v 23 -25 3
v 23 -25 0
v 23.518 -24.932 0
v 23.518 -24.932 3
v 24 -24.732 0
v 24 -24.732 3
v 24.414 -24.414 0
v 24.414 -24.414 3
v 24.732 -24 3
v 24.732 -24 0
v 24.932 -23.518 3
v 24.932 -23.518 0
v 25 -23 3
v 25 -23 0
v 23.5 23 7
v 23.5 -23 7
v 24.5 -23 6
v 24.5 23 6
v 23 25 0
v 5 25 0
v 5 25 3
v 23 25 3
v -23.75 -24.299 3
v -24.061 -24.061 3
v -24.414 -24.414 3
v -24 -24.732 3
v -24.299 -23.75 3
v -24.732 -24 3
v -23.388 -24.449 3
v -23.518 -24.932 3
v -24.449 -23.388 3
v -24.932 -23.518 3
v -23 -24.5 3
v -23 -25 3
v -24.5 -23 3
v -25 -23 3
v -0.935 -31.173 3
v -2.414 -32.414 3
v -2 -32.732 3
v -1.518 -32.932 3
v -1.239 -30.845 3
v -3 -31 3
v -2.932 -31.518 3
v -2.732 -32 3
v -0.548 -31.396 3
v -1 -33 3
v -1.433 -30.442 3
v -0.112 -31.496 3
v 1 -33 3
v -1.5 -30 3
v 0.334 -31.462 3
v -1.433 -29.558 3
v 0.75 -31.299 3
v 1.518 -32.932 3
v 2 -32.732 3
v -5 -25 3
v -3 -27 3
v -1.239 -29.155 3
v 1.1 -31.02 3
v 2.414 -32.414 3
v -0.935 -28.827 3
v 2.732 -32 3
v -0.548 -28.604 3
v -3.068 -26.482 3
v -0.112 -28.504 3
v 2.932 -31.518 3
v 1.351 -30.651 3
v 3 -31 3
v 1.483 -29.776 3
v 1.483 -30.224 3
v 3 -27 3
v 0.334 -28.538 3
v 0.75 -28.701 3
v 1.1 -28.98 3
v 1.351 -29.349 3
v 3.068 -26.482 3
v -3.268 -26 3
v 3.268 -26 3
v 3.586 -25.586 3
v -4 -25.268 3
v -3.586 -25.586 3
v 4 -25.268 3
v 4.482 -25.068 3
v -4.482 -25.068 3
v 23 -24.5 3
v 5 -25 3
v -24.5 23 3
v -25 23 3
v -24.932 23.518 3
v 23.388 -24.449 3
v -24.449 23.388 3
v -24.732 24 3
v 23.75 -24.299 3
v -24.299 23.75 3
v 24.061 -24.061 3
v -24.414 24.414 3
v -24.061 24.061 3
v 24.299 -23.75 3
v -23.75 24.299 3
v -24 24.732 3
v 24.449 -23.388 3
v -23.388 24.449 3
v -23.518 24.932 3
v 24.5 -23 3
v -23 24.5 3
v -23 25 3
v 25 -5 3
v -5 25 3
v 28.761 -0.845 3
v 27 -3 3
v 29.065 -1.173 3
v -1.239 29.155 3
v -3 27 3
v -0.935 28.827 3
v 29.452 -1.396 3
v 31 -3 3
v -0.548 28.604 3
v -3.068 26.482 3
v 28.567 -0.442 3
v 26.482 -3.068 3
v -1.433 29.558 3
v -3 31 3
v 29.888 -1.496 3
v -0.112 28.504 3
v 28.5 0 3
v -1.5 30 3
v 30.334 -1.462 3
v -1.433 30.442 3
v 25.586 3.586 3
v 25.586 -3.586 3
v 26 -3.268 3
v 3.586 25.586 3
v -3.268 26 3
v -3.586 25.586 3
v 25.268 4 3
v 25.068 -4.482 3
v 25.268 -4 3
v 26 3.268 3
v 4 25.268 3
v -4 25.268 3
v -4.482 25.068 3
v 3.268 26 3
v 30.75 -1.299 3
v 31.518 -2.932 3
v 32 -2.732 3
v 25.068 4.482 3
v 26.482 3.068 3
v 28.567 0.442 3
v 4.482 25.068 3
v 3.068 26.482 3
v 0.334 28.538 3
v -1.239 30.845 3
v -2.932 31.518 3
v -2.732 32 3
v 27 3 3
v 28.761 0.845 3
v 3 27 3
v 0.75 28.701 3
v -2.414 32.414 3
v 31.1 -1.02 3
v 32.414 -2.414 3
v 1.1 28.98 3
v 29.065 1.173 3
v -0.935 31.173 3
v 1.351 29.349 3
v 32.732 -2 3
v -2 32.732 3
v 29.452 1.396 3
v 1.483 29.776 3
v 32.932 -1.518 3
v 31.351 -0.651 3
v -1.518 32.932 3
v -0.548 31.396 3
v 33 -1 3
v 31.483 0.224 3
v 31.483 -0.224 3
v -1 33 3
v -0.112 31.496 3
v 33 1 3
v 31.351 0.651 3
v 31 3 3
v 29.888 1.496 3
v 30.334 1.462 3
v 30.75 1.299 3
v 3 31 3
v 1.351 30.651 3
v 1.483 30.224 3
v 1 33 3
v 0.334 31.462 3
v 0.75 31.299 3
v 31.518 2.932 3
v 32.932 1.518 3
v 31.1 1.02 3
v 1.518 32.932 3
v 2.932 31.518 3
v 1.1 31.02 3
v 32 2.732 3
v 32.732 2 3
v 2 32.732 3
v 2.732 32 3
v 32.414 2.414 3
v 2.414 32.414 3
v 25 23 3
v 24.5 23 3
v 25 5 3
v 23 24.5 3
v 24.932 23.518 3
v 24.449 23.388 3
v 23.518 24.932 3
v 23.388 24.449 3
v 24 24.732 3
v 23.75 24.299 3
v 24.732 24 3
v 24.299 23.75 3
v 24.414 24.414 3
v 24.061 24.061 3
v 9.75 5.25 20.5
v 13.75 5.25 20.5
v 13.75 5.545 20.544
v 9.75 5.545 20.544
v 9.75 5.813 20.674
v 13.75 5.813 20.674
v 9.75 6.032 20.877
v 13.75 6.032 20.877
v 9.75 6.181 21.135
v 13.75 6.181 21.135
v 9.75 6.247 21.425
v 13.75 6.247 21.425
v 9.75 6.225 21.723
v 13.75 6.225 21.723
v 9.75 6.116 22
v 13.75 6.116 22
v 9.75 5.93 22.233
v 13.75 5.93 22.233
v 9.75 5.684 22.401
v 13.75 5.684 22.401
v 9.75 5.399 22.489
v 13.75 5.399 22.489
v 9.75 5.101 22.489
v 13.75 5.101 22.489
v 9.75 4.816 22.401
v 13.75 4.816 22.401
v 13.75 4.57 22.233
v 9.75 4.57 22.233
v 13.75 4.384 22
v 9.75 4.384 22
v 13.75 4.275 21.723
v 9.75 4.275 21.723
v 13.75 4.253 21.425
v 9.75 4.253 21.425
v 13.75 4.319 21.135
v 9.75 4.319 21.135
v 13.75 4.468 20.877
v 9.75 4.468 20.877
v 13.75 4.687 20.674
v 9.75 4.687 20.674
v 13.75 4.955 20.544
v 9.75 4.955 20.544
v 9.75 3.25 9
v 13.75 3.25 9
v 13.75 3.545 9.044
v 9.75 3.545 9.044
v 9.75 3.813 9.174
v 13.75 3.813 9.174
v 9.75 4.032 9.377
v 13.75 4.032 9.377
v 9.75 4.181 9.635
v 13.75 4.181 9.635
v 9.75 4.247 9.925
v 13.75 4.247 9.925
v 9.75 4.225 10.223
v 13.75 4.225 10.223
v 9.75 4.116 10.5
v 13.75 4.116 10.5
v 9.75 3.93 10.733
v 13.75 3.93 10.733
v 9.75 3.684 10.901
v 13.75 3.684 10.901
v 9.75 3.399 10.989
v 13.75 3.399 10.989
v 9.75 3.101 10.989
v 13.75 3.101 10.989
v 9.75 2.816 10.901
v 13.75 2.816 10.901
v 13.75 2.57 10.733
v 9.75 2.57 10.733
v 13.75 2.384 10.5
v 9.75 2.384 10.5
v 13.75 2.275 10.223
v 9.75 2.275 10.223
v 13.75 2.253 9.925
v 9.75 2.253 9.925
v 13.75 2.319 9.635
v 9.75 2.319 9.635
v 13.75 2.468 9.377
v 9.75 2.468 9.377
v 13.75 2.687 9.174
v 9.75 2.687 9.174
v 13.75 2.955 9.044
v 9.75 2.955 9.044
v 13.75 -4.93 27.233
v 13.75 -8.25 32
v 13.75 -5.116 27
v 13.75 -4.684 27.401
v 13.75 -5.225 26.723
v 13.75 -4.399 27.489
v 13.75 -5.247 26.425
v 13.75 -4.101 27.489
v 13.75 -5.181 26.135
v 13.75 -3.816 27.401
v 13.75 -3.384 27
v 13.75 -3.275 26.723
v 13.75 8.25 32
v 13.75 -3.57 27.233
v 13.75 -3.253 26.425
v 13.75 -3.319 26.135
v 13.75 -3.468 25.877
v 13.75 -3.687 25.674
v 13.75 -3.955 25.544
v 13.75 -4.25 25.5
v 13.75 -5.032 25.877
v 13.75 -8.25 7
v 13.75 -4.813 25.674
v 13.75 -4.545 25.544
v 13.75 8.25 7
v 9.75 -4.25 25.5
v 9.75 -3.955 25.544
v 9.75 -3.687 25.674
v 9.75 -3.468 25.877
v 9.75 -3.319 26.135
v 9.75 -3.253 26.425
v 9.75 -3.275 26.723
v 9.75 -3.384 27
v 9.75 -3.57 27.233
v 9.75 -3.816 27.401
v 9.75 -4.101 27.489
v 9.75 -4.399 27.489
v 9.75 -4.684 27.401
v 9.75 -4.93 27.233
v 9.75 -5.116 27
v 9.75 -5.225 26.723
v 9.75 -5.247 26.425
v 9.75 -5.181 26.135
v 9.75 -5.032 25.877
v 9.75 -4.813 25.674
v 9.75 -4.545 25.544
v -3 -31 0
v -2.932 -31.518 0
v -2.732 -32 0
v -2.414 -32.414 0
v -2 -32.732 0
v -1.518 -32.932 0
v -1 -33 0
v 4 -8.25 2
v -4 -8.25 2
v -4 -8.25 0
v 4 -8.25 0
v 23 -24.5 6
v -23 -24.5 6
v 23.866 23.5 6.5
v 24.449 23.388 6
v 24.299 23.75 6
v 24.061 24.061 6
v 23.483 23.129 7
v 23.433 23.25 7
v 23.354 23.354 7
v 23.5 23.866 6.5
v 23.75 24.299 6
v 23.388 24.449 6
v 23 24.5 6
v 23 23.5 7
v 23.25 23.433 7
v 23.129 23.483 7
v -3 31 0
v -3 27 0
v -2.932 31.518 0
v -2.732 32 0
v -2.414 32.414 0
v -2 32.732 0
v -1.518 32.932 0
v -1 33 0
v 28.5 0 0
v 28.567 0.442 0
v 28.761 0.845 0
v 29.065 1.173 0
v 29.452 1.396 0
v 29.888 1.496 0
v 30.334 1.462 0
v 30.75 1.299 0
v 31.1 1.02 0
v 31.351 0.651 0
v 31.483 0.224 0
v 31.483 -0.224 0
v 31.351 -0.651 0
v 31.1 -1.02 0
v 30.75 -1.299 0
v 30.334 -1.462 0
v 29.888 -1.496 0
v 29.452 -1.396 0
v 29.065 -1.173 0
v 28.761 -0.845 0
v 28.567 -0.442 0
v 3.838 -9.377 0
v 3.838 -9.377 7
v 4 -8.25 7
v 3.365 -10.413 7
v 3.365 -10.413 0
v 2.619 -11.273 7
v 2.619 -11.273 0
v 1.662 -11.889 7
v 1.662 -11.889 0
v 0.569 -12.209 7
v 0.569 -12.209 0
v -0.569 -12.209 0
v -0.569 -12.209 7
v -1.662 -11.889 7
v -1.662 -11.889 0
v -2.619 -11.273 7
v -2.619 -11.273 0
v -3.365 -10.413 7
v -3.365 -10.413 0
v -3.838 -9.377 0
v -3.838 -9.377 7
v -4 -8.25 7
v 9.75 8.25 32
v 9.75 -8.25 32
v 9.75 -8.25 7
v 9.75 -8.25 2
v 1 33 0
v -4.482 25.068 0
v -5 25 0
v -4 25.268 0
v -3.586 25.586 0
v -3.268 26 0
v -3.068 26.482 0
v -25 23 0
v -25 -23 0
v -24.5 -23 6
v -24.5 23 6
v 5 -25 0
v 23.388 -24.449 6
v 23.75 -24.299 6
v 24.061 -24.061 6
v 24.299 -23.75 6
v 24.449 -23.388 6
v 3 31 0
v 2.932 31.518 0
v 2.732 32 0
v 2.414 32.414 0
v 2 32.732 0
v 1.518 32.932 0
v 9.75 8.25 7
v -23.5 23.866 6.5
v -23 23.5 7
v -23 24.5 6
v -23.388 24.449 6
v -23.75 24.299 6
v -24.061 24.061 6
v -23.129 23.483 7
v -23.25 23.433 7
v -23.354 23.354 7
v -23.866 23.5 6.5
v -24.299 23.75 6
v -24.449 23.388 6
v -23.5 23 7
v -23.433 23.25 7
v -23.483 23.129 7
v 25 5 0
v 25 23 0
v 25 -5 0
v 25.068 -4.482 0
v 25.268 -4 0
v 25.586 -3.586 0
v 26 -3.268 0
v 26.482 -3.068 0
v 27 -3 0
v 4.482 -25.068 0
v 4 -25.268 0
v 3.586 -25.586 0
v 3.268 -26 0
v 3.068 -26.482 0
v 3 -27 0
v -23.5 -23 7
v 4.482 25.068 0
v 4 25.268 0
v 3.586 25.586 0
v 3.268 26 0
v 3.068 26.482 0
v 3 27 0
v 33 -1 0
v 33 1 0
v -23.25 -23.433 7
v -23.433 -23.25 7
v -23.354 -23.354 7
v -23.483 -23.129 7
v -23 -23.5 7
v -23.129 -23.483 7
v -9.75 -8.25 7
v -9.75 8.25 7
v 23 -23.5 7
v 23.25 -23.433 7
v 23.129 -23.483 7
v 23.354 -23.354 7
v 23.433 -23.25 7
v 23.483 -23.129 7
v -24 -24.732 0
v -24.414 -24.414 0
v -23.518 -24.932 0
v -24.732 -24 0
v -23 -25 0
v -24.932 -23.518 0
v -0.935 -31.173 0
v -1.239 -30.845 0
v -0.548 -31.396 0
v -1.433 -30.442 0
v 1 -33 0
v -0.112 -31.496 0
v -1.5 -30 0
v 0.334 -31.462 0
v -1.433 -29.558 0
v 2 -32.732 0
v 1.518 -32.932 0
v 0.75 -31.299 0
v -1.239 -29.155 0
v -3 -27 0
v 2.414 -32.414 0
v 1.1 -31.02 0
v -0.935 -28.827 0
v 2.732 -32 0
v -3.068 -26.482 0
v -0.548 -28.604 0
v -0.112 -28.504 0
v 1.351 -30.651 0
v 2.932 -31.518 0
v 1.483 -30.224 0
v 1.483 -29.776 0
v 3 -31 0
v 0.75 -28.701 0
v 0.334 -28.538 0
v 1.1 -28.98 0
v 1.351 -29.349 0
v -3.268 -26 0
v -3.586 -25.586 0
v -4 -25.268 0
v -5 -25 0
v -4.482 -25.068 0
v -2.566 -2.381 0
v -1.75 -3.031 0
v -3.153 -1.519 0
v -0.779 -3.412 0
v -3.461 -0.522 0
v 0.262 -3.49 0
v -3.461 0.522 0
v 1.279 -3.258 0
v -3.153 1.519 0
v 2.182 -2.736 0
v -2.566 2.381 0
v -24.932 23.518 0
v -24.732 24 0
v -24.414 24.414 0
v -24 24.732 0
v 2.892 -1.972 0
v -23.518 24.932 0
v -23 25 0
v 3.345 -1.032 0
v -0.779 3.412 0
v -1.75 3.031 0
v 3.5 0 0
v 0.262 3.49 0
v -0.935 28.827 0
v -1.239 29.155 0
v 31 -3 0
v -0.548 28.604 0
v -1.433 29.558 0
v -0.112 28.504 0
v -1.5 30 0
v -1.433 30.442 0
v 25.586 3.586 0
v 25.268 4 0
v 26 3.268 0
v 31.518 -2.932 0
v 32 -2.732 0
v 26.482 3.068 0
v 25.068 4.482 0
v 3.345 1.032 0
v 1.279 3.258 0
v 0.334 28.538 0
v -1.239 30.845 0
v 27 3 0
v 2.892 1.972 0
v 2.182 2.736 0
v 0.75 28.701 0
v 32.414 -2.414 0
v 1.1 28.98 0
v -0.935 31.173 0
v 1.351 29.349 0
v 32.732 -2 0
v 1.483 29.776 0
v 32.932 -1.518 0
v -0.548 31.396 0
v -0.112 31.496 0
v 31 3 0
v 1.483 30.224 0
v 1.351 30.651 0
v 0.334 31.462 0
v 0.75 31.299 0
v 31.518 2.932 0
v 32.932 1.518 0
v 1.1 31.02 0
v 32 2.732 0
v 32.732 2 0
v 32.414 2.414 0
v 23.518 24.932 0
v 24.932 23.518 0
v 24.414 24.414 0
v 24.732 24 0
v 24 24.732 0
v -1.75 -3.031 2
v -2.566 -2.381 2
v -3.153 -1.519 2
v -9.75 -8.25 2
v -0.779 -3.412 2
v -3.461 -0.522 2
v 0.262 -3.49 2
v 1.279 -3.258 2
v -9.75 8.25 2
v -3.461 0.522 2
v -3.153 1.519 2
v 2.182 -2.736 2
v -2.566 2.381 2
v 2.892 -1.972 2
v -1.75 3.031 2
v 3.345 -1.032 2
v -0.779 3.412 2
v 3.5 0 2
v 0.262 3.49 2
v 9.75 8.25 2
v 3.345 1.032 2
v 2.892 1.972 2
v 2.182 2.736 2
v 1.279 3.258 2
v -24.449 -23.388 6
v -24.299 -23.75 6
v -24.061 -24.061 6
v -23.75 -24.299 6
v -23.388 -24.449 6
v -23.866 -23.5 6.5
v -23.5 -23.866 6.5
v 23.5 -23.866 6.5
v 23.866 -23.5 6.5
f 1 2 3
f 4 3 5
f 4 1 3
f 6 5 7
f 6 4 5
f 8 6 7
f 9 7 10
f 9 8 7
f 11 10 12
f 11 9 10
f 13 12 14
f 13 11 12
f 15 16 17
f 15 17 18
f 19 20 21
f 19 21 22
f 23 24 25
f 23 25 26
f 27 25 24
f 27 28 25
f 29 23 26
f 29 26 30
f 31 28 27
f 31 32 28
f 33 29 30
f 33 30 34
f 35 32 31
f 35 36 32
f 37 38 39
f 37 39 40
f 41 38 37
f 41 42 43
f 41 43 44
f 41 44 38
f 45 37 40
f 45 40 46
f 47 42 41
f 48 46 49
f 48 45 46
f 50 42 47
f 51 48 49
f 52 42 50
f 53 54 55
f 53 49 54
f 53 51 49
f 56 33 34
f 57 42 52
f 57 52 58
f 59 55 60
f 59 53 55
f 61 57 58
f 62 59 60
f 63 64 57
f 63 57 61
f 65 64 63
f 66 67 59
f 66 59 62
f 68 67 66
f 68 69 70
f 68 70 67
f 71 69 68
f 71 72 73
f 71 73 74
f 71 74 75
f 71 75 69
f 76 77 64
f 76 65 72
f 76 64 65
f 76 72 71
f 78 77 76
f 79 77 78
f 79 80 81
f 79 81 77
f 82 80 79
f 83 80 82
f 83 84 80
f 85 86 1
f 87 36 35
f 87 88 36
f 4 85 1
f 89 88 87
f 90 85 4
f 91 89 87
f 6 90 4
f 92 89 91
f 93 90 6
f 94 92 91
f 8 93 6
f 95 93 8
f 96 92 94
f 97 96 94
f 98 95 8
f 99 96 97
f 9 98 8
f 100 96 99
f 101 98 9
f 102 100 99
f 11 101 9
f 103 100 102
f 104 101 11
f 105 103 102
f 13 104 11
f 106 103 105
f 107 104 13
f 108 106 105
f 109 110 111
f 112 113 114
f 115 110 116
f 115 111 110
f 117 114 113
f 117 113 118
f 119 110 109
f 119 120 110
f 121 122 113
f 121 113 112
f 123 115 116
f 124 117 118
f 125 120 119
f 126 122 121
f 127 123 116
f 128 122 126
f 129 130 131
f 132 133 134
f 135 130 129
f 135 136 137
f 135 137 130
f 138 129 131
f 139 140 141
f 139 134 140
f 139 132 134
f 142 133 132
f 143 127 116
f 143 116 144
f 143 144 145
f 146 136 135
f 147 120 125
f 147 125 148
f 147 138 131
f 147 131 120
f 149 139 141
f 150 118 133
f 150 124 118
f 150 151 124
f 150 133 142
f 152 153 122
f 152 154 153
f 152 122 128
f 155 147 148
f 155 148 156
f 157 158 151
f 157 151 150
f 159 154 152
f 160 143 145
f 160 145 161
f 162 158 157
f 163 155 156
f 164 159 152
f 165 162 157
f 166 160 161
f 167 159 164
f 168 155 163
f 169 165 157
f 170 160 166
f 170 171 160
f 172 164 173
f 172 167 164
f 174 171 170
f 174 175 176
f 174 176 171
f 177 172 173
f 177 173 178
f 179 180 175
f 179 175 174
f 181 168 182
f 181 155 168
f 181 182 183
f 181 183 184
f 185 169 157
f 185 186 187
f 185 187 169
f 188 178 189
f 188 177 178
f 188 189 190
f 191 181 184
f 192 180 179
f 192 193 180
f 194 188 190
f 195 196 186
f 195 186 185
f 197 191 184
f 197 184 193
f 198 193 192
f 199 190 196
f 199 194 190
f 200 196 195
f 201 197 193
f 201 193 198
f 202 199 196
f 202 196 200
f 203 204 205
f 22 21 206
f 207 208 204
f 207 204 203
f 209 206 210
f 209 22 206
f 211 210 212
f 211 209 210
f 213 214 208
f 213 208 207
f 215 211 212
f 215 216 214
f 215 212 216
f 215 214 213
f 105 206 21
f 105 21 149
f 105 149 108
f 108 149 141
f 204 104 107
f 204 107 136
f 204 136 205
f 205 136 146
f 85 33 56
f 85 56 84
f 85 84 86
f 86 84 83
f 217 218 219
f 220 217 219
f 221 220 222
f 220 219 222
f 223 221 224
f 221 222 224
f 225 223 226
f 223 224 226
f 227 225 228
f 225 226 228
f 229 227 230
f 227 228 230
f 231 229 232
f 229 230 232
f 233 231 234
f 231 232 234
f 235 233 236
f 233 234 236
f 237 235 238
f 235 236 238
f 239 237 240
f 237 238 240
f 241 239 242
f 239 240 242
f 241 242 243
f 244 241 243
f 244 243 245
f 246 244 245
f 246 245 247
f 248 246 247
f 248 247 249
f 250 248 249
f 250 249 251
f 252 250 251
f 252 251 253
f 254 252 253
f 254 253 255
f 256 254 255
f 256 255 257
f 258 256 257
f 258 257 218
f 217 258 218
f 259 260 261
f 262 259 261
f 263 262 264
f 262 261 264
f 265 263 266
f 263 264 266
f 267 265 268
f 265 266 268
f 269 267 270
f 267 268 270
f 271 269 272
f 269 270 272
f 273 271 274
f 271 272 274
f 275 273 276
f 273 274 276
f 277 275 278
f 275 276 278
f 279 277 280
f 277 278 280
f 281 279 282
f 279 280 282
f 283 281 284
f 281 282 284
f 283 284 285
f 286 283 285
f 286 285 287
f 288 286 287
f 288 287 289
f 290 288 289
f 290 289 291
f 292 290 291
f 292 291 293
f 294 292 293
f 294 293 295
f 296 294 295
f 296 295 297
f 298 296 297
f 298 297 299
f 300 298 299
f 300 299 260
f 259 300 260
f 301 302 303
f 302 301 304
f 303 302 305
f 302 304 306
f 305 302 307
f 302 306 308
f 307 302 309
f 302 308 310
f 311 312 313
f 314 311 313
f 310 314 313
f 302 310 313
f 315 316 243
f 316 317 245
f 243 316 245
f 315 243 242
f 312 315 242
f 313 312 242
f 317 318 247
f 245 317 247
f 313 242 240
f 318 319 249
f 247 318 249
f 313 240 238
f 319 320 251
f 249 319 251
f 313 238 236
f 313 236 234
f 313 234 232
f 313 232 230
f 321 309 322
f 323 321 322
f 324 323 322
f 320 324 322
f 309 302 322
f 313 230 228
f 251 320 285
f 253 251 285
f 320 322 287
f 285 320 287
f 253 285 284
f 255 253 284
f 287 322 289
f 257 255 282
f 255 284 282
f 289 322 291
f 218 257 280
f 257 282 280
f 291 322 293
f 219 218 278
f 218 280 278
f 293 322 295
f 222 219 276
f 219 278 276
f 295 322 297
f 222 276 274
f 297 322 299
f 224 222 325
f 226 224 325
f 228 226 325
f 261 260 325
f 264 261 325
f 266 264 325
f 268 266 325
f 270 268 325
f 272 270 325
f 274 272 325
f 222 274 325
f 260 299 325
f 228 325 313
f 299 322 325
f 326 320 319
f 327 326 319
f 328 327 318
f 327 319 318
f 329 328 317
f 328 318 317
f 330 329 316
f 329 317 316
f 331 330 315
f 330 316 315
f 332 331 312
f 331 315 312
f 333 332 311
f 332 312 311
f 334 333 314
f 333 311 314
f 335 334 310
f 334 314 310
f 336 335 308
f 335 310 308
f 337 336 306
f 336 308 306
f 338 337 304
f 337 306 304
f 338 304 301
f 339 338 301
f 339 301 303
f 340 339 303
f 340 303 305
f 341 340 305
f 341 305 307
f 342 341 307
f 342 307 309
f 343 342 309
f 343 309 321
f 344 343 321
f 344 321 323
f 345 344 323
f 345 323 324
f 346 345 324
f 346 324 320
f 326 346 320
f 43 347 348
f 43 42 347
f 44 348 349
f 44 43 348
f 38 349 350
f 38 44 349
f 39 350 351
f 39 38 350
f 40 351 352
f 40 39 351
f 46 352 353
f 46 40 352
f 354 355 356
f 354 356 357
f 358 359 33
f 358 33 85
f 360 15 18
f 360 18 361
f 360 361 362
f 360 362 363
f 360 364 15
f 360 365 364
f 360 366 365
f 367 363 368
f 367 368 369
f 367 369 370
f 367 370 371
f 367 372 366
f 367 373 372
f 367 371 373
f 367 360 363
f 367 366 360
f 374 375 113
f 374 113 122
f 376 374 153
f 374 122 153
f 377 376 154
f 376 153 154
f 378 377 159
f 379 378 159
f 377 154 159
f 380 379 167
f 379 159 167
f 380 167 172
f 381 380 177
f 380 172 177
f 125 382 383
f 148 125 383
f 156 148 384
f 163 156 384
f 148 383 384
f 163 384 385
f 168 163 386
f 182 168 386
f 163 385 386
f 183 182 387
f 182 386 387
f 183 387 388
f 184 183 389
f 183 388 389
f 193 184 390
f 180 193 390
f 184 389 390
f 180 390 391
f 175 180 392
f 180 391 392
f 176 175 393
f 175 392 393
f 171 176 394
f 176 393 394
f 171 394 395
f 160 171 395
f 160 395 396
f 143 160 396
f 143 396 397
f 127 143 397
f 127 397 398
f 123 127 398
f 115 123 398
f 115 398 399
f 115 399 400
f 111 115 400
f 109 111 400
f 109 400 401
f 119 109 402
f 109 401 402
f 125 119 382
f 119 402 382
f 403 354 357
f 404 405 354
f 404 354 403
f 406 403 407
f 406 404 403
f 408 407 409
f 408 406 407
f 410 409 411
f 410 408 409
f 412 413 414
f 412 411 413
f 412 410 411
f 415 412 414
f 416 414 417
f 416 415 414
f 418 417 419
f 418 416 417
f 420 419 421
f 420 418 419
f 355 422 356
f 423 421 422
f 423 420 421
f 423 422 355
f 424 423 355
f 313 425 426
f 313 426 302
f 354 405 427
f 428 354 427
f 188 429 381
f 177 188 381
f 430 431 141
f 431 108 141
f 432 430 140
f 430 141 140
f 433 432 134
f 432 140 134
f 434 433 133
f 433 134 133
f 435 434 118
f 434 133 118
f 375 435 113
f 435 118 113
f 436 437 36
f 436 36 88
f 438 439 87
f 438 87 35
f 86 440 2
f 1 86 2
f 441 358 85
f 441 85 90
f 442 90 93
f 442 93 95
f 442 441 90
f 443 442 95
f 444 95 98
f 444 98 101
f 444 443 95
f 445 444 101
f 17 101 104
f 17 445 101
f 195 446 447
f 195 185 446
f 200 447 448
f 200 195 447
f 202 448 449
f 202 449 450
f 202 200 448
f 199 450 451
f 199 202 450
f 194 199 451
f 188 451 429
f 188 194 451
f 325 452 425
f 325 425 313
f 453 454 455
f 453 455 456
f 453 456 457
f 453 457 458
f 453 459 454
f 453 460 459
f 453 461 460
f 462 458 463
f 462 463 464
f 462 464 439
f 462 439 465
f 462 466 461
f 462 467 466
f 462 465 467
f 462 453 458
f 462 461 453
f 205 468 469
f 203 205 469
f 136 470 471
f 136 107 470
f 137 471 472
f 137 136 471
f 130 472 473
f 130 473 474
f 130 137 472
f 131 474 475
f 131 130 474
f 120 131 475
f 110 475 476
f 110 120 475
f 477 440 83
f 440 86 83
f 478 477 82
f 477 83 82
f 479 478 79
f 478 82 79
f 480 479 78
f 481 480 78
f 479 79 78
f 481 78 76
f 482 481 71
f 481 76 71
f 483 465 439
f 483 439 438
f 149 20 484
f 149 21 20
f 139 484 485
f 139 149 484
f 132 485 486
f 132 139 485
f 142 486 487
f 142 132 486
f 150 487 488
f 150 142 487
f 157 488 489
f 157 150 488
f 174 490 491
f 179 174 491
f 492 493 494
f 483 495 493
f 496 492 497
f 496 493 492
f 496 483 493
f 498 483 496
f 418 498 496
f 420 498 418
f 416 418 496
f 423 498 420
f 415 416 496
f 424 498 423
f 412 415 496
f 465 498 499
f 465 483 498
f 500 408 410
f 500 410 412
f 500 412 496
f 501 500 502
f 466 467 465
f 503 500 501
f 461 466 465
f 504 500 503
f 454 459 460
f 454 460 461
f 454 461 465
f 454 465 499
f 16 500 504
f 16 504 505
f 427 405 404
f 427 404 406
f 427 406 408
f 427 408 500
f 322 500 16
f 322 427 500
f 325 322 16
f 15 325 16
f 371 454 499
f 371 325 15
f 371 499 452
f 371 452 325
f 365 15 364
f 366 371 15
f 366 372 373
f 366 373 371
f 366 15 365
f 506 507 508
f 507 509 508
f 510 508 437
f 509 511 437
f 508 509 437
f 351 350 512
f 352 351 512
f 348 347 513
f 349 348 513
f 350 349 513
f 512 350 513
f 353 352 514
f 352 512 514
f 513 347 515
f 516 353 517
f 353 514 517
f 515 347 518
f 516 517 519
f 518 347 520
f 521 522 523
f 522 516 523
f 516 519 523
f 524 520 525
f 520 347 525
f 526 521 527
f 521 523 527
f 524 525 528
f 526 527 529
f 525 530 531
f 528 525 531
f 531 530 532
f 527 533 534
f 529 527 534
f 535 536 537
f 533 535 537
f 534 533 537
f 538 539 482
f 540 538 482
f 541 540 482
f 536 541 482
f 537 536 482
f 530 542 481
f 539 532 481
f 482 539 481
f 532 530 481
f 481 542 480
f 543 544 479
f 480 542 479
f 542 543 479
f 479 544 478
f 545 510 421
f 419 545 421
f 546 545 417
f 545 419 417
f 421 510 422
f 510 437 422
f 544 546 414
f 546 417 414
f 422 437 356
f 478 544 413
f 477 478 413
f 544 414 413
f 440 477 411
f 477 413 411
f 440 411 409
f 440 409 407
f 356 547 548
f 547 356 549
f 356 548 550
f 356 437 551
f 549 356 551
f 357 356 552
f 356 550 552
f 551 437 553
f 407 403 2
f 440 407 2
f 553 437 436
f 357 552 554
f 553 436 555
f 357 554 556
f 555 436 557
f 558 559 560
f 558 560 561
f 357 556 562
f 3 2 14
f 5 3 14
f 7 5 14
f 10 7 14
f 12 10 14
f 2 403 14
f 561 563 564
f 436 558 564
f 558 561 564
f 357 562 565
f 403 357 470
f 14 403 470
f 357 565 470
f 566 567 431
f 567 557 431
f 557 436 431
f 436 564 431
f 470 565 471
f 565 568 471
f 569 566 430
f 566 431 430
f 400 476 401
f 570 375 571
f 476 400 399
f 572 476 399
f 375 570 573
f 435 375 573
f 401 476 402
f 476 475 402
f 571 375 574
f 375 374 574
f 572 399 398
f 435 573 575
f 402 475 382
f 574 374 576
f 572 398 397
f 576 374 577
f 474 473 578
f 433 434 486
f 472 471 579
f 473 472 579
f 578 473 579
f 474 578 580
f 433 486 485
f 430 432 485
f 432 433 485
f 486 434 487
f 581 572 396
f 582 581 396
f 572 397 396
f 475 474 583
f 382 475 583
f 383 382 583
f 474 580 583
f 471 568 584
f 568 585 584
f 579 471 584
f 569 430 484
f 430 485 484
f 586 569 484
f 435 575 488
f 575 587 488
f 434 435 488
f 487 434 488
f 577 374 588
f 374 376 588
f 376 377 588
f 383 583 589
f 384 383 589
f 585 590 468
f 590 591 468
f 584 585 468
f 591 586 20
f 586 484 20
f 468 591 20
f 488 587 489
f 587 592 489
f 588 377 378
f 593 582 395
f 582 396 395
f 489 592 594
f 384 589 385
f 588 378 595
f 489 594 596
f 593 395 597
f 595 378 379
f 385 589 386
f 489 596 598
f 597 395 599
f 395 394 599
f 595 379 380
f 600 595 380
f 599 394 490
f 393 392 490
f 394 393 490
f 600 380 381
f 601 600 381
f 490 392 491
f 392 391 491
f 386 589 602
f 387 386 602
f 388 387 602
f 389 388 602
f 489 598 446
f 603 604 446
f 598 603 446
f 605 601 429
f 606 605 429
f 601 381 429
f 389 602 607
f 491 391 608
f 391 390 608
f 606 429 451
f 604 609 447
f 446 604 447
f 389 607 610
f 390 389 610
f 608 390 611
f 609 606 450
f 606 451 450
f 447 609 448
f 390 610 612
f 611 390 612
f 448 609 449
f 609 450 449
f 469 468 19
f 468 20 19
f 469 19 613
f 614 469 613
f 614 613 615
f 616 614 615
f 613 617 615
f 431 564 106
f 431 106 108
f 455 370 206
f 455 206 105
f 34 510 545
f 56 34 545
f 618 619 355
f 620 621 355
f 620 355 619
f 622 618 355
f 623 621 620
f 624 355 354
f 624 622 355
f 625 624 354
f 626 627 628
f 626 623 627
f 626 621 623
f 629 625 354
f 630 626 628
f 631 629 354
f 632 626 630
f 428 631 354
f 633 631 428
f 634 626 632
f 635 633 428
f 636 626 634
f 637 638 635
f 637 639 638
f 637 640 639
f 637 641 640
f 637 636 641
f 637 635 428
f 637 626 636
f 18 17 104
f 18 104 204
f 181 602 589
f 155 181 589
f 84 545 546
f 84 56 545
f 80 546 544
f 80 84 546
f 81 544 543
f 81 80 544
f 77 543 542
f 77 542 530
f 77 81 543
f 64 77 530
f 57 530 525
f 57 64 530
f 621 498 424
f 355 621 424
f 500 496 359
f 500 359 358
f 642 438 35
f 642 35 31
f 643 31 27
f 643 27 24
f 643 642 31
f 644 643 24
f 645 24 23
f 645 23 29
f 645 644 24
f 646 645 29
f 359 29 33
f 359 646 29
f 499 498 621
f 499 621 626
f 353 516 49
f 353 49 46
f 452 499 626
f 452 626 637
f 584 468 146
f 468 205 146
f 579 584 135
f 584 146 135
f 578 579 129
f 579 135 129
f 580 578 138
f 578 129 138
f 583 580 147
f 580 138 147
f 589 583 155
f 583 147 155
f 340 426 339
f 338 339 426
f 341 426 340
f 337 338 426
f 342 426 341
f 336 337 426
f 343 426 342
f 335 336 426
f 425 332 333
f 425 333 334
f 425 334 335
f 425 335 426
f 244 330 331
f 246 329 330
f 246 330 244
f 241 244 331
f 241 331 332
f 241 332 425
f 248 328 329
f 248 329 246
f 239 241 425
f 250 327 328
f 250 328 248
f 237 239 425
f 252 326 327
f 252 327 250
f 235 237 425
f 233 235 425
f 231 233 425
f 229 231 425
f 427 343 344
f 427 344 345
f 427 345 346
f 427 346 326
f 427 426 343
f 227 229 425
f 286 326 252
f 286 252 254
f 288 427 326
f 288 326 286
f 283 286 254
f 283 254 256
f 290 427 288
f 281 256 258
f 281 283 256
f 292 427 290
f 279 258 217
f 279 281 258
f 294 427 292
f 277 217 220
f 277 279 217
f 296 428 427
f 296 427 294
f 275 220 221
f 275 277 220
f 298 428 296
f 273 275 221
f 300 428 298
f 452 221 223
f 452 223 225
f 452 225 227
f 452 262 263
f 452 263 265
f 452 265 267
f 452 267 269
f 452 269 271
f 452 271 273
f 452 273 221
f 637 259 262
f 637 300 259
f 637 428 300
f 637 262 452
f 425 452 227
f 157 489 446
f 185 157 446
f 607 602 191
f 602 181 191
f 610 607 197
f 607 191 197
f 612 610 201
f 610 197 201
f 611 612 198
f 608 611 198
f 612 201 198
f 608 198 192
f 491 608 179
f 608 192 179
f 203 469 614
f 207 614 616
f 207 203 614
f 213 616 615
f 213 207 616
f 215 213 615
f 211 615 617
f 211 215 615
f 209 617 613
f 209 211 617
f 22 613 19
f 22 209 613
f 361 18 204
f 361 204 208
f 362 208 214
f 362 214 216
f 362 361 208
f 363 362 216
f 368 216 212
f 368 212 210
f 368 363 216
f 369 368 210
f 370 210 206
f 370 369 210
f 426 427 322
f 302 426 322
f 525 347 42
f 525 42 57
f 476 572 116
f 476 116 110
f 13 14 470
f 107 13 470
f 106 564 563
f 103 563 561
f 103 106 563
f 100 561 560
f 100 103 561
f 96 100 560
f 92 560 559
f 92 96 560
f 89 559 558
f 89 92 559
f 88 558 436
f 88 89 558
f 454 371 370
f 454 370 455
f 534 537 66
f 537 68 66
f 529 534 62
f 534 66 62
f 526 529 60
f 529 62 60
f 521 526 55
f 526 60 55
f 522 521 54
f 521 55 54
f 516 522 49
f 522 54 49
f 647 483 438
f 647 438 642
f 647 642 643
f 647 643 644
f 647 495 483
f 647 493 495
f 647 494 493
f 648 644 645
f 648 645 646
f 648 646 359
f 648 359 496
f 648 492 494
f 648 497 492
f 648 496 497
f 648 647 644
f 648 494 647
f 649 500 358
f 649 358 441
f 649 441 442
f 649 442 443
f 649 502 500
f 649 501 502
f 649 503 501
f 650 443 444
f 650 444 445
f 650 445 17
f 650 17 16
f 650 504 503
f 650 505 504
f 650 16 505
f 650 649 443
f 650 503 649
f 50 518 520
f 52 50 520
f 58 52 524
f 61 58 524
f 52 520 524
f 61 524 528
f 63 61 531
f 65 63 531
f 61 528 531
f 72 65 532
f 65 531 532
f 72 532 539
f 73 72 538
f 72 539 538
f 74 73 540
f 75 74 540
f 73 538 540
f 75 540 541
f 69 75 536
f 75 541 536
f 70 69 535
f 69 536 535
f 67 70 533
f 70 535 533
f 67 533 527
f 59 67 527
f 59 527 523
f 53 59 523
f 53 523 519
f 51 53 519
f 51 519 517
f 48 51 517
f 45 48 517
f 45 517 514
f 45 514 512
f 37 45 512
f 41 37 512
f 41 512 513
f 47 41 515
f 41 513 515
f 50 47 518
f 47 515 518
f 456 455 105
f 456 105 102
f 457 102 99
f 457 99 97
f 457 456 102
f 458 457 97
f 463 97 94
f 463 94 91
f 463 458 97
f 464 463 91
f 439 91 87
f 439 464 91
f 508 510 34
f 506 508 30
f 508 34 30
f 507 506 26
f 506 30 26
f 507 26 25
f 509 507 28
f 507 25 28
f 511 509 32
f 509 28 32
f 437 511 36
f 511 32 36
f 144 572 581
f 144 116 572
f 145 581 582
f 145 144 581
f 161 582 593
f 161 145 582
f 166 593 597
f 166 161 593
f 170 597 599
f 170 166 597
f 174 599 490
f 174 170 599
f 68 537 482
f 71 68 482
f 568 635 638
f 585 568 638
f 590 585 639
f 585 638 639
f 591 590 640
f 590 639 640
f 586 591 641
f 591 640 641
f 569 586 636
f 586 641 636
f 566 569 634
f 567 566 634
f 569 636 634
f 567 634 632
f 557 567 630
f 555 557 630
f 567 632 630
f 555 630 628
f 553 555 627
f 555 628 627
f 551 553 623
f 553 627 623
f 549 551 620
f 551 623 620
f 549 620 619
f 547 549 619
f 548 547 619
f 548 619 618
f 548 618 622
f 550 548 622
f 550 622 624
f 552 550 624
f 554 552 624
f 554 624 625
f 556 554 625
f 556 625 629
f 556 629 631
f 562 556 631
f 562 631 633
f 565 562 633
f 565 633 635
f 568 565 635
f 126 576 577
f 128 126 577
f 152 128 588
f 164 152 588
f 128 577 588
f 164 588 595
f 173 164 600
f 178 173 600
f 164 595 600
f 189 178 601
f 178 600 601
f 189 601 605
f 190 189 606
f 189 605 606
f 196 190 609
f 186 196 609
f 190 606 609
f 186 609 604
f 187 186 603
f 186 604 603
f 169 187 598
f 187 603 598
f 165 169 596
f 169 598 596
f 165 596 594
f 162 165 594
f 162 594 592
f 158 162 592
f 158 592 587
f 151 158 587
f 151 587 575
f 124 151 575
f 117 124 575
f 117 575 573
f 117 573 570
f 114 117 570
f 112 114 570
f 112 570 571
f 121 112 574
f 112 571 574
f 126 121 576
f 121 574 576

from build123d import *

# Parameters (mm, degrees)
SKETCH1_W           = 50
SKETCH1_H           = 50
BOSS_EXTRUDE1_DEPTH = 7
SKETCH3_W           = 19.5
SKETCH3_H           = 16.5
CUT_EXTRUDE1_DEPTH  = 5
SKETCH4_R           = 3.5
CUT_EXTRUDE2_DEPTH  = 5
CUT_EXTRUDE4_DEPTH  = 37.041642582
SKETCH6_W           = 4
SKETCH6_H           = 16.5
BOSS_EXTRUDE2_DEPTH = 25
SKETCH7_R           = 1
CUT_EXTRUDE5_DEPTH  = 57.129871726
SKETCH10_W          = 6
SKETCH10_H          = 8
SKETCH10_R          = 1.5
SKETCH10_W_2        = 8
SKETCH10_H_2        = 6
BOSS_EXTRUDE3_DEPTH = 3
FILLET1_R           = 2
FILLET2_R           = 2
CUT_EXTRUDE6_DEPTH  = 4
CHAMFER1_SIZE       = 1


with BuildPart() as part:
    # Sketch1 → Boss-Extrude1 (new body)
    with BuildSketch(Plane.XY):
        Rectangle(SKETCH1_W, SKETCH1_H)
    extrude(amount=BOSS_EXTRUDE1_DEPTH)

    # Sketch3 → Cut-Extrude1 (cut)
    with BuildSketch(Plane.XY.offset(7)):
        Rectangle(SKETCH3_W, SKETCH3_H)
    extrude(amount=-CUT_EXTRUDE1_DEPTH, mode=Mode.SUBTRACT)

    # Sketch4 → Cut-Extrude2 (cut)
    with BuildSketch(Plane.XY.offset(2)):
        Circle(SKETCH4_R)
    extrude(amount=-CUT_EXTRUDE2_DEPTH, mode=Mode.SUBTRACT)

    # Sketch5 → Cut-Extrude4 (cut, through all)
    with BuildSketch(Plane.XY.offset(7)):
        with BuildLine():
            Line((-4, -8.25), (4, -8.25))
            ThreePointArc((4, -8.25), (0, -12.25), (-4, -8.25))
        make_face()
    extrude(amount=-CUT_EXTRUDE4_DEPTH, mode=Mode.SUBTRACT)

    # Sketch6 → Boss-Extrude2 (add)
    with BuildSketch(Plane.XY.offset(7)):
        with Locations((11.75, 0)):
            Rectangle(SKETCH6_W, SKETCH6_H)
    extrude(amount=BOSS_EXTRUDE2_DEPTH)

    # Sketch7 → Cut-Extrude5 (cut, through all)
    with BuildSketch(Plane(origin=(13.75, 0, 0), x_dir=(0, 0, -1), z_dir=(1, 0, 0))):
        with Locations((-10, 3.25)):
            Circle(SKETCH7_R)
        with Locations((-26.5, -4.25)):
            Circle(SKETCH7_R)
        with Locations((-21.5, 5.25)):
            Circle(SKETCH7_R)
    extrude(amount=-CUT_EXTRUDE5_DEPTH, mode=Mode.SUBTRACT)

    # Sketch10 → Boss-Extrude3 (add)
    # profile 1 of 3: a face of its own
    with BuildSketch(Plane(origin=(0, 0, 0), x_dir=(-1, 0, 0), z_dir=(0, 0, -1))):
        with Locations((0, 29)):
            Rectangle(SKETCH10_W, SKETCH10_H)
        with Locations((0, 30)):
            Circle(SKETCH10_R, mode=Mode.SUBTRACT)
    # profile 2 of 3: a face of its own
    with BuildSketch(Plane(origin=(0, 0, 0), x_dir=(-1, 0, 0), z_dir=(0, 0, -1))):
        with Locations((-29, 0)):
            Rectangle(SKETCH10_W_2, SKETCH10_H_2)
        with Locations((-30, 0)):
            Circle(SKETCH10_R, mode=Mode.SUBTRACT)
    # profile 3 of 3: a face of its own
    with BuildSketch(Plane(origin=(0, 0, 0), x_dir=(-1, 0, 0), z_dir=(0, 0, -1))):
        with Locations((0, -29)):
            Rectangle(SKETCH10_W, SKETCH10_H)
        with Locations((0, -30)):
            Circle(SKETCH10_R, mode=Mode.SUBTRACT)
    extrude(amount=-BOSS_EXTRUDE3_DEPTH)

    # Fillet1
    fillet1_edges = [part.edges().sort_by_distance(p)[0] for p in [
        (3, -25, 1.5),
        (-3, -25, 1.5),
        (-3, -33, 1.5),
        (3, -33, 1.5),
        (25, 3, 1.5),
        (25, -3, 1.5),
        (33, -3, 1.5),
        (33, 3, 1.5),
        (-3, 25, 1.5),
        (3, 25, 1.5),
        (3, 33, 1.5),
        (-3, 33, 1.5),
    ]]
    fillet(fillet1_edges, radius=FILLET1_R)

    # Fillet2
    fillet2_edges = [part.edges().sort_by_distance(p)[0] for p in [
        (25, -25, 3.5),
        (-25, -25, 3.5),
        (-25, 25, 3.5),
        (25, 25, 3.5),
    ]]
    fillet(fillet2_edges, radius=FILLET2_R)

    # Sketch11 → Cut-Extrude6 (cut)
    with BuildSketch(Plane.XY.offset(7)):
        with BuildLine():
            Line((23, 25), (-23, 25))
            ThreePointArc((-23, 25), (-24.414213562, 24.414213562), (-25, 23))
            Line((-25, 23), (-25, -23))
            ThreePointArc((-25, -23), (-24.414213562, -24.414213562), (-23, -25))
            Line((-23, -25), (23, -25))
            ThreePointArc((23, -25), (24.414213562, -24.414213562), (25, -23))
            Line((25, -23), (25, 23))
            ThreePointArc((25, 23), (24.414213562, 24.414213562), (23, 25))
        make_face()
        with BuildLine():
            Line((23, 24.5), (-23, 24.5))
            ThreePointArc((-23, 24.5), (-24.060660172, 24.060660172), (-24.5, 23))
            Line((-24.5, 23), (-24.5, -23))
            ThreePointArc((-24.5, -23), (-24.060660172, -24.060660172), (-23, -24.5))
            Line((-23, -24.5), (23, -24.5))
            ThreePointArc((23, -24.5), (24.060660172, -24.060660172), (24.5, -23))
            Line((24.5, -23), (24.5, 23))
            ThreePointArc((24.5, 23), (24.060660172, 24.060660172), (23, 24.5))
        make_face(mode=Mode.SUBTRACT)
    extrude(amount=-CUT_EXTRUDE6_DEPTH, mode=Mode.SUBTRACT)

    # Chamfer1
    chamfer1_edges = [part.edges().sort_by_distance(p)[0] for p in [
        (0, 24.5, 7),
        (-24.060660172, 24.060660172, 7),
        (-24.5, 0, 7),
        (-24.060660172, -24.060660172, 7),
        (0, -24.5, 7),
        (24.060660172, -24.060660172, 7),
        (24.5, 0, 7),
        (24.060660172, 24.060660172, 7),
    ]]
    chamfer(chamfer1_edges, length=CHAMFER1_SIZE)


solid = part.part
